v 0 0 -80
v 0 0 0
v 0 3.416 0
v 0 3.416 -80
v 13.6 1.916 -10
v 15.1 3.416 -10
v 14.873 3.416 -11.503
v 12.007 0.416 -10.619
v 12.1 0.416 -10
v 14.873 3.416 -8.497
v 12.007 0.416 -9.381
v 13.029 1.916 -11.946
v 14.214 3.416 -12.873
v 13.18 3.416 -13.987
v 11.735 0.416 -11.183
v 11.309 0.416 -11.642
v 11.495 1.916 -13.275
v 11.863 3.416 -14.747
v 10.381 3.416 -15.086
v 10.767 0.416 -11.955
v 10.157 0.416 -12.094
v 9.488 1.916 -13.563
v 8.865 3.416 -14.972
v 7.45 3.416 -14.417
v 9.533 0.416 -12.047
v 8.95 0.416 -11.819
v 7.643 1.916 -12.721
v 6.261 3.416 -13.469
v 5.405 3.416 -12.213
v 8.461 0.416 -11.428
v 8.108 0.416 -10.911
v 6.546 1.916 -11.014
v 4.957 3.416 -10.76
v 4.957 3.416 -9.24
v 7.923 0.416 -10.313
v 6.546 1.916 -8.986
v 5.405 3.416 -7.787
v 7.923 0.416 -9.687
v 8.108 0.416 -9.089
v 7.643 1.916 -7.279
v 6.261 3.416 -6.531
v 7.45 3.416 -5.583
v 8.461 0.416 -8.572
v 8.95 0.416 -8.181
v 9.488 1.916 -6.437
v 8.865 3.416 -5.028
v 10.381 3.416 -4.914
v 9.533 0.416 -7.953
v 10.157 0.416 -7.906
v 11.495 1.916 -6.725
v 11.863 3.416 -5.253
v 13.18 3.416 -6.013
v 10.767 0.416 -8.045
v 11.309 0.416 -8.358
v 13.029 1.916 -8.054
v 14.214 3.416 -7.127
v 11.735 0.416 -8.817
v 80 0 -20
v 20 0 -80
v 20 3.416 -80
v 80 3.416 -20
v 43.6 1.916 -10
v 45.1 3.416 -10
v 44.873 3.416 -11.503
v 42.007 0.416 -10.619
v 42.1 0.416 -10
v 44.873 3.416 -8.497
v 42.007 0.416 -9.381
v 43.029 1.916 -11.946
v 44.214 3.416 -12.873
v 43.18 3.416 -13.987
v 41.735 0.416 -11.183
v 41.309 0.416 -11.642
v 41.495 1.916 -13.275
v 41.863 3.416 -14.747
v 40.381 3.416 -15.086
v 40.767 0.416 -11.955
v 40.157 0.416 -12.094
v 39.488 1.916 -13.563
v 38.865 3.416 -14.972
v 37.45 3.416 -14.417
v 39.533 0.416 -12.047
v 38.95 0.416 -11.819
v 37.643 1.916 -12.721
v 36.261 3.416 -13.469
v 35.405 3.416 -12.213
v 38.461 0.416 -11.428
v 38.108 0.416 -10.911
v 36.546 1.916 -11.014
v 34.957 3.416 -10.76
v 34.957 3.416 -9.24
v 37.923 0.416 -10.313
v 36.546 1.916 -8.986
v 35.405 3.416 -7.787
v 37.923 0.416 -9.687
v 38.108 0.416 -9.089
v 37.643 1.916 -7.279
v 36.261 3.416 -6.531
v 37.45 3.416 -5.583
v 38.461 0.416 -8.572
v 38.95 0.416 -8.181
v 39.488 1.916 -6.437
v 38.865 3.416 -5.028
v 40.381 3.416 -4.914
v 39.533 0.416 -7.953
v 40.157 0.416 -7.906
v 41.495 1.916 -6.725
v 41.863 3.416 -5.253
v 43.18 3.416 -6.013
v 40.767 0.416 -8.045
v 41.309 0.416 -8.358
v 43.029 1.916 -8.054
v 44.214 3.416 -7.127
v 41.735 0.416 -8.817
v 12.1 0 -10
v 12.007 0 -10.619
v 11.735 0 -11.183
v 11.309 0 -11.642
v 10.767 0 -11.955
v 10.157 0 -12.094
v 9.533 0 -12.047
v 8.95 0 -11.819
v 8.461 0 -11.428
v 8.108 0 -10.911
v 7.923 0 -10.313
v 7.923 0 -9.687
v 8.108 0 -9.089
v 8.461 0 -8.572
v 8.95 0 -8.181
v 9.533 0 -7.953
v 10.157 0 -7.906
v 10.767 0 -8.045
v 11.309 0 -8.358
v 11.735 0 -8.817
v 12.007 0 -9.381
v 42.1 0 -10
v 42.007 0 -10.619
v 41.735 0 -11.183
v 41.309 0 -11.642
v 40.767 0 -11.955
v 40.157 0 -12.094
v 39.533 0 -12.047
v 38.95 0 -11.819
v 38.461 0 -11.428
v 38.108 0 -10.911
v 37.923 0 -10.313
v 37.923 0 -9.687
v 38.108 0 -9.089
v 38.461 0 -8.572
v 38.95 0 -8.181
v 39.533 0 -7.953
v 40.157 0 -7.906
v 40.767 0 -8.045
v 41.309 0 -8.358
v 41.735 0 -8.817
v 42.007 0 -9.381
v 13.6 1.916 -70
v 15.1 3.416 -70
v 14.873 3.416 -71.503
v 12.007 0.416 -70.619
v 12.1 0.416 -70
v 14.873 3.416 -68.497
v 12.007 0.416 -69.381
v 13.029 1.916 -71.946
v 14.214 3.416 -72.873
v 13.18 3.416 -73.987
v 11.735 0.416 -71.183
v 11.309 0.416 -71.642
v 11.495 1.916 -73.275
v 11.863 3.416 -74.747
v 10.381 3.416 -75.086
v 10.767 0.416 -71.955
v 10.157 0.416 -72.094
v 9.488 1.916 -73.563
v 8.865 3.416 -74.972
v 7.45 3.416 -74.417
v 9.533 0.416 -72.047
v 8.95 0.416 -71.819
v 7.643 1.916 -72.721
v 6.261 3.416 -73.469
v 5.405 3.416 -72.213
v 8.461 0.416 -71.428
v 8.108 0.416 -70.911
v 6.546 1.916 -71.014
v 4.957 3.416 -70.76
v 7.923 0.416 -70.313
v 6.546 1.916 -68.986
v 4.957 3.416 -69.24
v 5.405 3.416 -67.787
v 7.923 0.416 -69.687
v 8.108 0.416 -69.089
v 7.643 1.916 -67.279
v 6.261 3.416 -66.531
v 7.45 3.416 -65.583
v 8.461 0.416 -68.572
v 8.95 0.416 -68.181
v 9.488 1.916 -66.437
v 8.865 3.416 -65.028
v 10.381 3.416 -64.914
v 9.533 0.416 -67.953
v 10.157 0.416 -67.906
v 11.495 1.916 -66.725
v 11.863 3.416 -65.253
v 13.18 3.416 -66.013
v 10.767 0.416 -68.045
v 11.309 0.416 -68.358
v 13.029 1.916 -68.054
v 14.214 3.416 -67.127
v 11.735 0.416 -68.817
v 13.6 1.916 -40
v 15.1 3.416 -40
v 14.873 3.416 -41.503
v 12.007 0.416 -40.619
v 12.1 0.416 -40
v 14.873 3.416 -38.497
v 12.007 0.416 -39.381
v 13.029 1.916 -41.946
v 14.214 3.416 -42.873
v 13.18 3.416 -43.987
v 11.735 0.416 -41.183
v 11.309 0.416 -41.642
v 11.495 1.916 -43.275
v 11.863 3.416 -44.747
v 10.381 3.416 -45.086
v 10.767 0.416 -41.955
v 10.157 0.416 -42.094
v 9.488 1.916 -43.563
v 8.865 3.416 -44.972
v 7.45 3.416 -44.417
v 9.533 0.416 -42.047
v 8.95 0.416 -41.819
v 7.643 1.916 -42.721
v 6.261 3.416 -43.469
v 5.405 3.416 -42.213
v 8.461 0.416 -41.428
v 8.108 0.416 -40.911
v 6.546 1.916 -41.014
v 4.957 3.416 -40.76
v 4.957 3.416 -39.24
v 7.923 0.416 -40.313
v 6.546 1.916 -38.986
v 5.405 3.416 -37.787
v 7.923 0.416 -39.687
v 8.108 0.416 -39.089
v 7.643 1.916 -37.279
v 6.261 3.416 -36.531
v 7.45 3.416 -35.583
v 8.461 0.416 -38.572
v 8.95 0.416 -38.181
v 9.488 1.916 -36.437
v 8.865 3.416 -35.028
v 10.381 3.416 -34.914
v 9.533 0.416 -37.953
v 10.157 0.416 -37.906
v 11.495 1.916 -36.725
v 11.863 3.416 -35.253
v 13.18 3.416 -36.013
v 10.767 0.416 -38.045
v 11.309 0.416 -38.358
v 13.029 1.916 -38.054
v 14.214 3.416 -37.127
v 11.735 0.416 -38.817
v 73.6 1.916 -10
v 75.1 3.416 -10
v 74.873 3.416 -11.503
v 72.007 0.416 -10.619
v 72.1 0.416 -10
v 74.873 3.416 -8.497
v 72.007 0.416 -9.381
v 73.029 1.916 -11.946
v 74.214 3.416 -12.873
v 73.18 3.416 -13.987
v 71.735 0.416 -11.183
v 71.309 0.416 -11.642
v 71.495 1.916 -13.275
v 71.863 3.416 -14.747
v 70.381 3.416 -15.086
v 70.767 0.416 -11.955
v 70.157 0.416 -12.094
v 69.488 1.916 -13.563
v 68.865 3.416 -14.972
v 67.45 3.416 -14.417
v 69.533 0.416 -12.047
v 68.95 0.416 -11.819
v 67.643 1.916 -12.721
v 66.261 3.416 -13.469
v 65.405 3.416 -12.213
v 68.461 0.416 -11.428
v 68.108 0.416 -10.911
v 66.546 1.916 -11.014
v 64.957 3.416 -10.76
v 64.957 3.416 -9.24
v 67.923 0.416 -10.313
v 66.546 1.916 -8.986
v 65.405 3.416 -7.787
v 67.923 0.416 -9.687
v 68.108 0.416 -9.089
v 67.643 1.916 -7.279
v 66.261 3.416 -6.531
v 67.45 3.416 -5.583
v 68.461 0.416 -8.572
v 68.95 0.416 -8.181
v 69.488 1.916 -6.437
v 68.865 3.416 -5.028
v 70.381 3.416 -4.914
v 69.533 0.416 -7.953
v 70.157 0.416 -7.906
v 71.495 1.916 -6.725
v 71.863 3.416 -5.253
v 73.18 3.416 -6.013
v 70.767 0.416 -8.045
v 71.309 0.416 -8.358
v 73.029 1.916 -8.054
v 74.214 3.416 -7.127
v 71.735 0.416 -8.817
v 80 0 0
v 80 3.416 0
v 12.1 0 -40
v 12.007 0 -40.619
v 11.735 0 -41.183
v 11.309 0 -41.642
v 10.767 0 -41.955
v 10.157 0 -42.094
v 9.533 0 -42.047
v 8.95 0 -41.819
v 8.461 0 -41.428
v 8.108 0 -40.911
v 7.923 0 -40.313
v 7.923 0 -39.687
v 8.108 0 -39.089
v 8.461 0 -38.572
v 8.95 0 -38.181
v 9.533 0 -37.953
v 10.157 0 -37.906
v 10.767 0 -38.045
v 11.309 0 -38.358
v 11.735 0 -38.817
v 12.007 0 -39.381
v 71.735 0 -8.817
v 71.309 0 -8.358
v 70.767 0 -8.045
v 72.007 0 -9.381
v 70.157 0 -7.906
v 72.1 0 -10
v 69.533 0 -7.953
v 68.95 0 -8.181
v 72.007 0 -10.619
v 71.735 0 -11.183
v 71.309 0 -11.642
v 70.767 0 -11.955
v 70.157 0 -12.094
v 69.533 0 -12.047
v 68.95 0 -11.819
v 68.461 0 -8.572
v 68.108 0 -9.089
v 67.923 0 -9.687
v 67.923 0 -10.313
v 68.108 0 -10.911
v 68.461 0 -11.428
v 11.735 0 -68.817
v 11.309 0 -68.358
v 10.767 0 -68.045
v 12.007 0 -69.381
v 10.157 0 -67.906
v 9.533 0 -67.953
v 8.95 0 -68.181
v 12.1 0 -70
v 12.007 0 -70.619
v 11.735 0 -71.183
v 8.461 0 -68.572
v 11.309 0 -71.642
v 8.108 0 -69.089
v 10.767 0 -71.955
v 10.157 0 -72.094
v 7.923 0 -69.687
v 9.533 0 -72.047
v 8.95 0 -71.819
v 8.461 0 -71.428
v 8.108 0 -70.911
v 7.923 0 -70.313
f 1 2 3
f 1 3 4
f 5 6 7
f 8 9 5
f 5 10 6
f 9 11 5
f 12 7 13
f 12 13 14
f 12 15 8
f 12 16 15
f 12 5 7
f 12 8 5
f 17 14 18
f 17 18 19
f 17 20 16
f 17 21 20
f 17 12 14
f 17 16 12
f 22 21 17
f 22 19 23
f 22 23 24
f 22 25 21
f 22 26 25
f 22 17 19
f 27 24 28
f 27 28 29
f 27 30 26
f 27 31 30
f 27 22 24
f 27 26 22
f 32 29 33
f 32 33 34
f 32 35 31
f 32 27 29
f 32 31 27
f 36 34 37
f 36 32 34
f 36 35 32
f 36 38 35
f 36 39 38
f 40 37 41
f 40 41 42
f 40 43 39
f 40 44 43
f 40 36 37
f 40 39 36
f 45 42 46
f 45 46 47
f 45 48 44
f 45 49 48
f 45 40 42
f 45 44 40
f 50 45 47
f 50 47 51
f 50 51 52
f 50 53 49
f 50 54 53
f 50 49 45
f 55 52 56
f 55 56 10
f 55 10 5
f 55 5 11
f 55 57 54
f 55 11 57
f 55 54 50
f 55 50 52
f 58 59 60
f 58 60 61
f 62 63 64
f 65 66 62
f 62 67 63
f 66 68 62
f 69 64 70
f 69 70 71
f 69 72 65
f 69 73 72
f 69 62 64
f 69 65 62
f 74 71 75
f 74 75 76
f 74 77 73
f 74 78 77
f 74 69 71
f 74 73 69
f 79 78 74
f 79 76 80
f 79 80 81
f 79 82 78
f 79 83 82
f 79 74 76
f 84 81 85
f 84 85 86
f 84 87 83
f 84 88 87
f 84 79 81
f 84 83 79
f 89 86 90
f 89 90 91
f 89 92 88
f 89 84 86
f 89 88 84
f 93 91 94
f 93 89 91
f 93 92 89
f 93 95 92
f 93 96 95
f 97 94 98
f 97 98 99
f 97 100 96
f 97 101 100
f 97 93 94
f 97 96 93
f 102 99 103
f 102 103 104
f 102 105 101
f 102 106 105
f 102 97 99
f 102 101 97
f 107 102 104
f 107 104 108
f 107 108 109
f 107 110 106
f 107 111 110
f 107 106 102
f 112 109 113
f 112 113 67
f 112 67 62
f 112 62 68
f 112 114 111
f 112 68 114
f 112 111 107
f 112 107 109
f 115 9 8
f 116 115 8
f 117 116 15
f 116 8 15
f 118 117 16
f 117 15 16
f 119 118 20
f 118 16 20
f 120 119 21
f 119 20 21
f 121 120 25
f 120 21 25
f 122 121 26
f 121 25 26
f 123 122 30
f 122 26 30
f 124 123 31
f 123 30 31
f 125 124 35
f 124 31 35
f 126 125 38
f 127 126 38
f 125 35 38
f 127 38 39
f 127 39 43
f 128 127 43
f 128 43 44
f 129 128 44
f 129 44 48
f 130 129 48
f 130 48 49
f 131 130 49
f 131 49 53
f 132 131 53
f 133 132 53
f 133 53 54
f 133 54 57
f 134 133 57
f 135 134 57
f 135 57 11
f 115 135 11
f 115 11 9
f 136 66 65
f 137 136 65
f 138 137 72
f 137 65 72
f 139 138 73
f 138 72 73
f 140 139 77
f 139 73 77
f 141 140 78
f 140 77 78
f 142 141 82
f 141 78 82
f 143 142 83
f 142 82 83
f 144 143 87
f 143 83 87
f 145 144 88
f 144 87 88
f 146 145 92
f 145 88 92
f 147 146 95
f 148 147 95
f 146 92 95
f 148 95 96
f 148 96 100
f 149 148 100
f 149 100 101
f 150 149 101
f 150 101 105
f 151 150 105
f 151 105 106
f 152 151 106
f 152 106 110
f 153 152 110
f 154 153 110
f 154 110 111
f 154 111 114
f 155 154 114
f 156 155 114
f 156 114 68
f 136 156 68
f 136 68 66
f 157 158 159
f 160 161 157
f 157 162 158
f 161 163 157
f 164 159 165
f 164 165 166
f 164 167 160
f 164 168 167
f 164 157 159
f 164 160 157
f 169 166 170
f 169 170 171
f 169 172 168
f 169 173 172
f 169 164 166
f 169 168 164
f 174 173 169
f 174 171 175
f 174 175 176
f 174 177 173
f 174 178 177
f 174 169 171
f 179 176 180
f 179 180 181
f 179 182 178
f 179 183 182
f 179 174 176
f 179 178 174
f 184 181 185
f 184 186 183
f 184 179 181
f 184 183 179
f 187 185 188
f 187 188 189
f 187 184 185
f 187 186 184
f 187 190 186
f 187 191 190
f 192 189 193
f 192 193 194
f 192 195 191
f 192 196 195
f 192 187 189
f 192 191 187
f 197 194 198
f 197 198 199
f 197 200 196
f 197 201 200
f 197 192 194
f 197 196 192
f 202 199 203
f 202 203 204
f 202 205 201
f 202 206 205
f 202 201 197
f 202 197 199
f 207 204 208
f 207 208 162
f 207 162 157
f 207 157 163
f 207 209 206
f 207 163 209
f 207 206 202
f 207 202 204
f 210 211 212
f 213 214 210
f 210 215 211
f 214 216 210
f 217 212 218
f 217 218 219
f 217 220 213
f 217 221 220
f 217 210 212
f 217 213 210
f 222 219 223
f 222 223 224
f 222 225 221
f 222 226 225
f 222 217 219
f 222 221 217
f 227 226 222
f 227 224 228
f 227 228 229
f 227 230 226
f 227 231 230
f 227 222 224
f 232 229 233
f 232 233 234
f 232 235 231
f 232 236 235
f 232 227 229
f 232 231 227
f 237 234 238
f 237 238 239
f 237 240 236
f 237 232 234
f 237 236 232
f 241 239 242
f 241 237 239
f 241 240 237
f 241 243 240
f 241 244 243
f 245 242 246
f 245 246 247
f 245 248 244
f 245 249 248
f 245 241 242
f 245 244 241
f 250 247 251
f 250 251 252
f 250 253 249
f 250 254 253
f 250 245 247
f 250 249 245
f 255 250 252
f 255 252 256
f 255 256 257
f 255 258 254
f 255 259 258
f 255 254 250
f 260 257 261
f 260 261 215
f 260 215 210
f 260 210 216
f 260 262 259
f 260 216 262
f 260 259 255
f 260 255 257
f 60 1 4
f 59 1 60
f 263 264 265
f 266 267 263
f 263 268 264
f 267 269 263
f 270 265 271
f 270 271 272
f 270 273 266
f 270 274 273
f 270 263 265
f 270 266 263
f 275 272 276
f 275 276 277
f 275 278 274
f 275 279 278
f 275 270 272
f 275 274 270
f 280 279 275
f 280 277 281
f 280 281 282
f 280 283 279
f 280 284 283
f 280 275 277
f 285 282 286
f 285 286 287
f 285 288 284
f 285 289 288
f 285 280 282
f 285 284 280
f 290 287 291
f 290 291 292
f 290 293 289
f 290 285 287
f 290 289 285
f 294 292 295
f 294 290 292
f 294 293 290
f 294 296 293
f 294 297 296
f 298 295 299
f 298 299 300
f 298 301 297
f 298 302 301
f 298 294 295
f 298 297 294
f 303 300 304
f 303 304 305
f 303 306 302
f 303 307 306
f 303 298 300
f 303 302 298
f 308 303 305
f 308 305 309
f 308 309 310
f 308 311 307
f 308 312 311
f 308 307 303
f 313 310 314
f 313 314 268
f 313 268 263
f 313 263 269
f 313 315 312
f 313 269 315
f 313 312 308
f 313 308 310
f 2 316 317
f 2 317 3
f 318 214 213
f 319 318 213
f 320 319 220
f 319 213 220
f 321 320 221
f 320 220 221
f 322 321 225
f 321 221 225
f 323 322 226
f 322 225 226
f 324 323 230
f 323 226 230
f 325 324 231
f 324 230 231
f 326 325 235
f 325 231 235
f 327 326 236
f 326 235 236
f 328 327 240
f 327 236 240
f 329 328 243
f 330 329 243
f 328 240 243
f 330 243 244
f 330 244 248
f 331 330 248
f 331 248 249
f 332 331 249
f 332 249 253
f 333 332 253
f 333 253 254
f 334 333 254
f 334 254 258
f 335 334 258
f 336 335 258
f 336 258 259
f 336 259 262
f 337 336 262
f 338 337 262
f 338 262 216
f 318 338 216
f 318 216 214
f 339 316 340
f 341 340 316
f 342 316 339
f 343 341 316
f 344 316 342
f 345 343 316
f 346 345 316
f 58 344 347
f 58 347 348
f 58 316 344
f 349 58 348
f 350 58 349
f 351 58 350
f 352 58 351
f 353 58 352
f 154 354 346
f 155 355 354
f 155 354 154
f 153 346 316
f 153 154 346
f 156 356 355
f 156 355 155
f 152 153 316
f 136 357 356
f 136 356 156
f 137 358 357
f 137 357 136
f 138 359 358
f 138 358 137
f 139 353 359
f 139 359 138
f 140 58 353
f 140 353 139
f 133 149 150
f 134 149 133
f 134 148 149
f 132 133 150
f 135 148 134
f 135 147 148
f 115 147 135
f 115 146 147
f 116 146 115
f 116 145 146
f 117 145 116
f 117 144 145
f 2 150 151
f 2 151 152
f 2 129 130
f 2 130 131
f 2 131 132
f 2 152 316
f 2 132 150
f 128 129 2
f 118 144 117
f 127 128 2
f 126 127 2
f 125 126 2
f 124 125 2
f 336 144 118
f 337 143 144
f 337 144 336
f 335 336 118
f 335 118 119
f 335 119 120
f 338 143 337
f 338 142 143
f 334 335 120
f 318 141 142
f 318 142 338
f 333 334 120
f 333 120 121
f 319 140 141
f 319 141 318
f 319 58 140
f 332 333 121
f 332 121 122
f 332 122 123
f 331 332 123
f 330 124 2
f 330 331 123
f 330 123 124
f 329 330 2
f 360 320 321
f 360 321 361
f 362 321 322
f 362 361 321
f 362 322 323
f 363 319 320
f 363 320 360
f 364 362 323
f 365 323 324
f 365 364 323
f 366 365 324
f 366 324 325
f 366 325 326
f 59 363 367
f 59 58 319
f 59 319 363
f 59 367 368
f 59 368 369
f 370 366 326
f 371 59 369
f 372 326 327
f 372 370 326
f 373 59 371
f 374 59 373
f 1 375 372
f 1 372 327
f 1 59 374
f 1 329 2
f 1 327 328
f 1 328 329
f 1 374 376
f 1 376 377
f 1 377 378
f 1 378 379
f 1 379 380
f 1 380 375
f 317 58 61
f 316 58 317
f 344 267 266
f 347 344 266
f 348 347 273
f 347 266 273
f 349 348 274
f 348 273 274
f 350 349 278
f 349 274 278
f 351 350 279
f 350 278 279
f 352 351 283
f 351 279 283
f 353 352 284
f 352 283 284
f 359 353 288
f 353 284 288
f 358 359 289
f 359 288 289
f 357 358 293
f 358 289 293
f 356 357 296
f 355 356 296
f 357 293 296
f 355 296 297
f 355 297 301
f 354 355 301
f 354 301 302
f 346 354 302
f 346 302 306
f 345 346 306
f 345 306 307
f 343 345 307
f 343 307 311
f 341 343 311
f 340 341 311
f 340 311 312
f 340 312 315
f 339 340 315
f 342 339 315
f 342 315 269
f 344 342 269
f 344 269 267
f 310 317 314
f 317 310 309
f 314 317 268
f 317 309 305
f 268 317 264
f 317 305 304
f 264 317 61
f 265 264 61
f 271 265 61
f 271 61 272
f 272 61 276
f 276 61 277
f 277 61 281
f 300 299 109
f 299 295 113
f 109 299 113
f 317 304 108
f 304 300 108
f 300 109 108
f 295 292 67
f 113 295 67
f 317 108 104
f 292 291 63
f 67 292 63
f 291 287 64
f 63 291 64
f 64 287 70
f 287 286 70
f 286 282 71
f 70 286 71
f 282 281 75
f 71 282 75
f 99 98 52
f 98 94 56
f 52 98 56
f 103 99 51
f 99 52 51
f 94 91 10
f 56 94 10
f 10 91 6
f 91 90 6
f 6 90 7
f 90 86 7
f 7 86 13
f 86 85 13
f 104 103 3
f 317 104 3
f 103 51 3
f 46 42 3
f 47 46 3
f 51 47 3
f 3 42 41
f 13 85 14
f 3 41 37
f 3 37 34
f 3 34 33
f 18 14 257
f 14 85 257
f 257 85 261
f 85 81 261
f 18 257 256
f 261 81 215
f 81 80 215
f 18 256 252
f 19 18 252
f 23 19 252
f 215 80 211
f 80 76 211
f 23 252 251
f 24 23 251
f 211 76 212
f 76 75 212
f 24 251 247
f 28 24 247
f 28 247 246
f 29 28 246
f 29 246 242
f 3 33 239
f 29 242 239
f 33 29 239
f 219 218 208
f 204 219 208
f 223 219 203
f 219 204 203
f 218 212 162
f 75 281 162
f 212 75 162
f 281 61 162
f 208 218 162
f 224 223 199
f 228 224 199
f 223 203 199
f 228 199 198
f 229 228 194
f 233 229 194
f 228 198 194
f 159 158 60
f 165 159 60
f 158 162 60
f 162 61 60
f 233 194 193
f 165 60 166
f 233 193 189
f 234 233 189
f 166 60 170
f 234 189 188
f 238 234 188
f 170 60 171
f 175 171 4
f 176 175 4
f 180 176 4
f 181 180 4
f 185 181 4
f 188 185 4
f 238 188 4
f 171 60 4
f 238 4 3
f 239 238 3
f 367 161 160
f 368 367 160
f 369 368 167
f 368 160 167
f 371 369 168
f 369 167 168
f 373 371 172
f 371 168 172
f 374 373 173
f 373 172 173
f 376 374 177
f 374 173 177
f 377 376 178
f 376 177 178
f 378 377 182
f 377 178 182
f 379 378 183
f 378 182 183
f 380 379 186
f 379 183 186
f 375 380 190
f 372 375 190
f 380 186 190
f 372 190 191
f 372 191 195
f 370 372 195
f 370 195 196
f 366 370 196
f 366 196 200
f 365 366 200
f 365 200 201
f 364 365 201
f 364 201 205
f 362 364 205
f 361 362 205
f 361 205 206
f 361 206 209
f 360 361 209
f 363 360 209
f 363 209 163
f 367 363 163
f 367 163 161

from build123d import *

# Parameters (mm, degrees)
BOSS_EXTRUDE1_DEPTH = 3.416
SKETCH3_R           = 2.1
CUT_EXTRUDE1_DEPTH  = 4
CHAMFER1_SIZE       = 3


with BuildPart() as part:
    # Sketch1 → Boss-Extrude1 (new body)
    with BuildSketch(Plane(origin=(0, 0, 0), x_dir=(1, 0, 0), z_dir=(0, 1, 0))):
        Polygon((0, 0), (0, 80), (20, 80), (80, 20), (80, 0), align=None)
    extrude(amount=BOSS_EXTRUDE1_DEPTH)

    # Sketch3 → Cut-Extrude1 (cut)
    with BuildSketch(Plane(origin=(0, 3.416, 0), x_dir=(1, 0, 0), z_dir=(0, 1, 0))):
        with Locations((10, 10)):
            Circle(SKETCH3_R)
        with Locations((40, 10)):
            Circle(SKETCH3_R)
        with Locations((70, 10)):
            Circle(SKETCH3_R)
        with Locations((10, 40)):
            Circle(SKETCH3_R)
        with Locations((10, 70)):
            Circle(SKETCH3_R)
    extrude(amount=-CUT_EXTRUDE1_DEPTH, mode=Mode.SUBTRACT)

    # Chamfer1
    chamfer1_edges = [part.edges().sort_by_distance(p)[0] for p in [
        (7.9, 3.416, -70),
        (7.9, 3.416, -40),
        (67.9, 3.416, -10),
        (7.9, 3.416, -10),
        (37.9, 3.416, -10),
    ]]
    chamfer(chamfer1_edges, length=CHAMFER1_SIZE)


solid = part.part
